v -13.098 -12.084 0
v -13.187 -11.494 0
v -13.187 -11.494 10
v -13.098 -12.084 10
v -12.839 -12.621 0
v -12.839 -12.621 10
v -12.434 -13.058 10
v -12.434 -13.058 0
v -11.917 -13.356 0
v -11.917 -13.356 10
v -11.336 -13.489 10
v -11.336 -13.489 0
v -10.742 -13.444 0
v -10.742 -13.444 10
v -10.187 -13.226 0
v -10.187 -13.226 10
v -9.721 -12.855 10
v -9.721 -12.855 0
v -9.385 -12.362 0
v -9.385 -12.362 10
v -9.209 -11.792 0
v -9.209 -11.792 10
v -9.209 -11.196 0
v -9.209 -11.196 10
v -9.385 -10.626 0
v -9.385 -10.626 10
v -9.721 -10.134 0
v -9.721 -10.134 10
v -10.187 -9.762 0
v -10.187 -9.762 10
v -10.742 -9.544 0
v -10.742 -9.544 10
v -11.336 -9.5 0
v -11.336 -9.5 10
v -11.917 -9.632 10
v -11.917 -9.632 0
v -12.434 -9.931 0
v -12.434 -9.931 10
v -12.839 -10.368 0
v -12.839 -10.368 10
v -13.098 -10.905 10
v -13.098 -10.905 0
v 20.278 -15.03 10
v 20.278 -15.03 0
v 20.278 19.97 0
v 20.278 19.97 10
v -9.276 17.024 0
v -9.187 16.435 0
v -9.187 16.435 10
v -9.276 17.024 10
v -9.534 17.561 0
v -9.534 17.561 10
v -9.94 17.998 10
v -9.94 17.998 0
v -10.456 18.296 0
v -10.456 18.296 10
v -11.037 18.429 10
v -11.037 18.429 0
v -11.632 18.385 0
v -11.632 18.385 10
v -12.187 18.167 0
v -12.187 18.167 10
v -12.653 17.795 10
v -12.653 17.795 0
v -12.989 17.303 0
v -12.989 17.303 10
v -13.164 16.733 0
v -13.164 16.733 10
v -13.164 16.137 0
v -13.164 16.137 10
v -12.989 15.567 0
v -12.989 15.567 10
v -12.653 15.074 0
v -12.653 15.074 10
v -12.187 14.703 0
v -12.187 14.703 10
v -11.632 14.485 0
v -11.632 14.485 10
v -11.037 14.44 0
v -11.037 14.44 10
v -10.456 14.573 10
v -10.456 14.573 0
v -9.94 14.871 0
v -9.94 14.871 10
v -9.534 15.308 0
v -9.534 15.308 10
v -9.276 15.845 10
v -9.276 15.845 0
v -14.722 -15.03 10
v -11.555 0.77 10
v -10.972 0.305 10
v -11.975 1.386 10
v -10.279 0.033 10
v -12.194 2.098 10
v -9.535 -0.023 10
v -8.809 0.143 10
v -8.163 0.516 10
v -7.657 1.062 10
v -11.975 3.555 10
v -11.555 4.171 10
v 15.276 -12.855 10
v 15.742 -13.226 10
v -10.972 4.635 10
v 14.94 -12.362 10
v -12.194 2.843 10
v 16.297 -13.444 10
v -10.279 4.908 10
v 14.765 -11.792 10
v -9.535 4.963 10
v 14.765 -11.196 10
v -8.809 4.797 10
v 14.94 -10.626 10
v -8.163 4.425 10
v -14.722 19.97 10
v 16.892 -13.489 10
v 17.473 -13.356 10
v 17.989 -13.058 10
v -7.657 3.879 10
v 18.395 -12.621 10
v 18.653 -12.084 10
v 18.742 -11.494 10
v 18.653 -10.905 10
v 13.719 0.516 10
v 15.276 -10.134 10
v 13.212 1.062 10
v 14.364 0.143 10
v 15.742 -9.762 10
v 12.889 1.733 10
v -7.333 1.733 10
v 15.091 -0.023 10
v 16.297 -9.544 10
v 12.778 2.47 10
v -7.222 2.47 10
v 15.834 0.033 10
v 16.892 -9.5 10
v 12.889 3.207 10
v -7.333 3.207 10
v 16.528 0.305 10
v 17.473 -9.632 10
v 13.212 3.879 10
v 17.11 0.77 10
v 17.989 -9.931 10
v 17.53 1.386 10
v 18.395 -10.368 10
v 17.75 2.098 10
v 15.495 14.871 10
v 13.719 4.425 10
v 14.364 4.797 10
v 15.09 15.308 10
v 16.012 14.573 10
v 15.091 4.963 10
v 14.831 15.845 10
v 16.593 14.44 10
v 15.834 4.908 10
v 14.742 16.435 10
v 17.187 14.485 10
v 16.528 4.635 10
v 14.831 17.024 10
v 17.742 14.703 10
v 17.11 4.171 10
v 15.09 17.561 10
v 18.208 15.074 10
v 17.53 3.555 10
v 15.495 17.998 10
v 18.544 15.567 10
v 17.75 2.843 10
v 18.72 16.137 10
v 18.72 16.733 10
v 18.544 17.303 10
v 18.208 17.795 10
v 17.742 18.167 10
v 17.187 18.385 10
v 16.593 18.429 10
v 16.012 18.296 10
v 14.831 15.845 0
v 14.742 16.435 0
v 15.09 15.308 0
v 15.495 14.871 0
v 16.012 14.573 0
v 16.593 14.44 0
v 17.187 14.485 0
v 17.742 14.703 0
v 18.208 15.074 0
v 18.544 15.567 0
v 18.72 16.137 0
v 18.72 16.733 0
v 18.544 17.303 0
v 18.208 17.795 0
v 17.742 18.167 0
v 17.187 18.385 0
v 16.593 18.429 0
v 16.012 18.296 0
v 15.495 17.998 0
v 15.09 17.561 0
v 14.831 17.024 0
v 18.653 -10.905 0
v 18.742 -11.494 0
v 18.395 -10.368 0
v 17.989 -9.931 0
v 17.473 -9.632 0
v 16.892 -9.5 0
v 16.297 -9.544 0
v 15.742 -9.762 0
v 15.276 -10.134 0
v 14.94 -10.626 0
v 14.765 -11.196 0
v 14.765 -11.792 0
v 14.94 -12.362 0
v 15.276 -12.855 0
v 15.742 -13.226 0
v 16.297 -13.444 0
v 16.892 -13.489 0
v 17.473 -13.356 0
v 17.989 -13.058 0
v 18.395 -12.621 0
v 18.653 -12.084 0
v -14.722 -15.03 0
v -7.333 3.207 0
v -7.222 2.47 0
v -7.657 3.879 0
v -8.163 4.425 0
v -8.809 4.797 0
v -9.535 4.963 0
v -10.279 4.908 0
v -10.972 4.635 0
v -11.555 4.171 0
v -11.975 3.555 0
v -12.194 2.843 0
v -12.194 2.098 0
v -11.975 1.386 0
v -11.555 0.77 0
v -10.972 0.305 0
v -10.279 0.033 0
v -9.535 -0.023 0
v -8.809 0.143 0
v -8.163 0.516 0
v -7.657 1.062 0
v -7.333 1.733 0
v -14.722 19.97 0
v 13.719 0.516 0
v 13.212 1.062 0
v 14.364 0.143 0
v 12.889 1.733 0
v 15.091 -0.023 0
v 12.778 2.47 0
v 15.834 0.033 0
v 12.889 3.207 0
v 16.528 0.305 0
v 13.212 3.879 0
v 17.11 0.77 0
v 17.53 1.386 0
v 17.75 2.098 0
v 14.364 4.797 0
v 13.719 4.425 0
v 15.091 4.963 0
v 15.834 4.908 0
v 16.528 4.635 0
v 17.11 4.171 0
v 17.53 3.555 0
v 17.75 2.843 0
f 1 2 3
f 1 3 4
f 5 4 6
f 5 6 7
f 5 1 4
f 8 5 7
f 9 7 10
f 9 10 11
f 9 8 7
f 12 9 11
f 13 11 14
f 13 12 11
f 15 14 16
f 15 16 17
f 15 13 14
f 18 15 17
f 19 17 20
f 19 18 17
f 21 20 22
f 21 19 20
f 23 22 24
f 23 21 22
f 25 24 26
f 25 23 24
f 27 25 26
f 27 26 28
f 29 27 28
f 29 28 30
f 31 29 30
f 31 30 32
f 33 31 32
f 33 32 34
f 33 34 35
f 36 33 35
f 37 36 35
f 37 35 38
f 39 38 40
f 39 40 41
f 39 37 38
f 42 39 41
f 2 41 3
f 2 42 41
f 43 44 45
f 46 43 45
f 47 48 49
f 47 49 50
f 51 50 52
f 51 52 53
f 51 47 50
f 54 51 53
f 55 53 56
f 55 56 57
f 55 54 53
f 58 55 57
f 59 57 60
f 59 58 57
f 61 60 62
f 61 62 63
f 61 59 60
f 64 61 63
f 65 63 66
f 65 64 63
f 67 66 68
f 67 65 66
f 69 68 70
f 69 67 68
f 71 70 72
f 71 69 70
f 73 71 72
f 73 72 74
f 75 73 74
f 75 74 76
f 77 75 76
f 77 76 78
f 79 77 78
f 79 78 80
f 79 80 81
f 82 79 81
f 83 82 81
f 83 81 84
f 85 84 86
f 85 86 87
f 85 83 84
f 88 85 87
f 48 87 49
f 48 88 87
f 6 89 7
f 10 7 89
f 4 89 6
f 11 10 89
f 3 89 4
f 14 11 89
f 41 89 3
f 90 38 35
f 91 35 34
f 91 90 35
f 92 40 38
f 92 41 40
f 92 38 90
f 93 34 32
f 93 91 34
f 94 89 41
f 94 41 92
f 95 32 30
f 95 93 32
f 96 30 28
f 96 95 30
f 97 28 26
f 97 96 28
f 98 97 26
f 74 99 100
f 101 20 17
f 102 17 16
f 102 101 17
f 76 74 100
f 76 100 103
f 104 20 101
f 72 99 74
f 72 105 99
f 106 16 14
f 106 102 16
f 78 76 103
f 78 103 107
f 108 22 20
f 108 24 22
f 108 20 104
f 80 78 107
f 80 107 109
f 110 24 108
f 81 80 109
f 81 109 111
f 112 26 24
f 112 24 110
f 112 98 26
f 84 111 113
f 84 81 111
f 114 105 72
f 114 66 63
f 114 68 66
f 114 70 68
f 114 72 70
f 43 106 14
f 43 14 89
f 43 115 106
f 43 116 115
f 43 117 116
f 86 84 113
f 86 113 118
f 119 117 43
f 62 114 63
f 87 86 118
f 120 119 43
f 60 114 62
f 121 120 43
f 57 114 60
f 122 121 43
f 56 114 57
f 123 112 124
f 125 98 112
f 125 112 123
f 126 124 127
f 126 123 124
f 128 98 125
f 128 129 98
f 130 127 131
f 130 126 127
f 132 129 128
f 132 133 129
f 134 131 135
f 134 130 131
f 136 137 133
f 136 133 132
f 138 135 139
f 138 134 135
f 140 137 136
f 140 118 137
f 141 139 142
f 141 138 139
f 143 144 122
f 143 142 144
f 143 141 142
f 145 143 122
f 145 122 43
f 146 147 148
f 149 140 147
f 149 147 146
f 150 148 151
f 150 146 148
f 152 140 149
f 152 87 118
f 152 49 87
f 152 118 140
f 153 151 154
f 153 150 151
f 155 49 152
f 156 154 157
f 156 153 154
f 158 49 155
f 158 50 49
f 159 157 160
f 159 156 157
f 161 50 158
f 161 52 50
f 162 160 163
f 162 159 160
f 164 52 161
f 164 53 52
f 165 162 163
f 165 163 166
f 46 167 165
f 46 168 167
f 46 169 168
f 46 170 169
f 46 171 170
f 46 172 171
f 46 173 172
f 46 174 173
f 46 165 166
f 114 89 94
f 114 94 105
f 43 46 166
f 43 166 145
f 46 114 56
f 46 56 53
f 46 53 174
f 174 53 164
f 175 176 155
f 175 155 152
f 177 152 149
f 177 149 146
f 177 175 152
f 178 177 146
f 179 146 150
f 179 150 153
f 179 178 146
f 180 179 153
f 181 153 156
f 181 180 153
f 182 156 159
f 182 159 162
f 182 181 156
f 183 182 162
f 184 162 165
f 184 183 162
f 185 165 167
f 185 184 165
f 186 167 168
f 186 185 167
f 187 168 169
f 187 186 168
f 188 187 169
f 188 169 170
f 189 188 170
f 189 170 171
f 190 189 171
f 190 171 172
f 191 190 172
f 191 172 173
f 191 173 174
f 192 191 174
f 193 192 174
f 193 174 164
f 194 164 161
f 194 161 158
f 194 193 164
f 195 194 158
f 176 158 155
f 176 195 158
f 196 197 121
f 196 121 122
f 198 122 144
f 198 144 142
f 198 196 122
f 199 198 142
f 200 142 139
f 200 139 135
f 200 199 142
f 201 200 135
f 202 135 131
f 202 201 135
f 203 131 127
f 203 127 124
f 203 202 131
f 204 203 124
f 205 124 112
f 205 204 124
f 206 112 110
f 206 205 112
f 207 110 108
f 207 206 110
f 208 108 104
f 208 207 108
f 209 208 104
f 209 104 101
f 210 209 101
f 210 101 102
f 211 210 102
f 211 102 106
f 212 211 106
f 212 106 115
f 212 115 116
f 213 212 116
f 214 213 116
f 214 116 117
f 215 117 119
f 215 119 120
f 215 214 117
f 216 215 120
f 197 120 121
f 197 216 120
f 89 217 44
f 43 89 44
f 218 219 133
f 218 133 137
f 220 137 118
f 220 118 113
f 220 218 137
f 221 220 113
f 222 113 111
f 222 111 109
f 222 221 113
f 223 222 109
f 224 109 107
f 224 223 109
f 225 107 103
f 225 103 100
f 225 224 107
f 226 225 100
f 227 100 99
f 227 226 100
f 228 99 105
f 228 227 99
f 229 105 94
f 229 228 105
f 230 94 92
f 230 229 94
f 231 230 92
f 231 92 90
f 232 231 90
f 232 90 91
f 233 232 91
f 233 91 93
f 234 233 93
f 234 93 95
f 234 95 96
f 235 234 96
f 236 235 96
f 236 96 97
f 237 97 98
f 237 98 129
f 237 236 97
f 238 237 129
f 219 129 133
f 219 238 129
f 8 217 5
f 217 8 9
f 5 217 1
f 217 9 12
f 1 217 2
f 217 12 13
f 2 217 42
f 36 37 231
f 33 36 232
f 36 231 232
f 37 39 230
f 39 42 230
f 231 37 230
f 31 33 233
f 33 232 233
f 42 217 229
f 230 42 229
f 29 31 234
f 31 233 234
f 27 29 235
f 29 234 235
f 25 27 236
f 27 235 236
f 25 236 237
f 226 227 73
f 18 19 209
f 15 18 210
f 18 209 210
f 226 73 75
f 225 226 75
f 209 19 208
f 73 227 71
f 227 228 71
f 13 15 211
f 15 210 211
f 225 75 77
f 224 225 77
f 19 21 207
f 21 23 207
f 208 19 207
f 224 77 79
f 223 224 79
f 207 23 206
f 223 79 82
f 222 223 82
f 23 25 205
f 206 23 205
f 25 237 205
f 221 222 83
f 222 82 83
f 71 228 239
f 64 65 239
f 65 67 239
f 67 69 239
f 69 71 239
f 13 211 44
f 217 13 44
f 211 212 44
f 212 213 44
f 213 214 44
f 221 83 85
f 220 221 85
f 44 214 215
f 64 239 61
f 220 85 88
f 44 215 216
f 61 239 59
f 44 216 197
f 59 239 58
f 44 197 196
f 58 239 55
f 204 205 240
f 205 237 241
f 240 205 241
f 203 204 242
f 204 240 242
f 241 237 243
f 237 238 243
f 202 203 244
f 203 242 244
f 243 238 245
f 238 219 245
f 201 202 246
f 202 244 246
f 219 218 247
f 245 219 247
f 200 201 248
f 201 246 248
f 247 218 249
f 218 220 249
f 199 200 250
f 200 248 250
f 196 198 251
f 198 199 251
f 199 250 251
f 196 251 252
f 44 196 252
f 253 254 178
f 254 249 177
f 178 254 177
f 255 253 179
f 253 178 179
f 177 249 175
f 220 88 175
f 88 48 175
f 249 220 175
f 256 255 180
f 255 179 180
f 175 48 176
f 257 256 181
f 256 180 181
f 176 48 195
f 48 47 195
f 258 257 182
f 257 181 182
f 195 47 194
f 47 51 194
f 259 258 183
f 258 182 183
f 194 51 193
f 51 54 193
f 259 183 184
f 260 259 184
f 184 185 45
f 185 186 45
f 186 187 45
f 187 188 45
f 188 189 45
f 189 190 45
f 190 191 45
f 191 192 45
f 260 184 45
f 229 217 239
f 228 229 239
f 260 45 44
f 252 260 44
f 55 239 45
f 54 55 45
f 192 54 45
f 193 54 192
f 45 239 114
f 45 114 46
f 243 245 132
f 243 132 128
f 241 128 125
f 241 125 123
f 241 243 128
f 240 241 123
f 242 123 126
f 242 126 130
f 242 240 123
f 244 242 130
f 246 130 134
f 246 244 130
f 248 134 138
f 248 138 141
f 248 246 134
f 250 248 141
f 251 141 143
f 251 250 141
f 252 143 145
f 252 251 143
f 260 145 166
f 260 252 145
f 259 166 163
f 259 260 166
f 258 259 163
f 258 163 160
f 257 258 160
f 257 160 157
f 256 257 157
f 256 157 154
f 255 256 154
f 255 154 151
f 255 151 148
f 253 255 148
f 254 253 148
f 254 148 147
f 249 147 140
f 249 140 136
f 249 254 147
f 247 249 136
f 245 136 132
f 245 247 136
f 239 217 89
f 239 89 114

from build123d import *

# Parameters (mm, degrees)
SKETCH1_W           = 35
SKETCH1_H           = 35
SKETCH1_R           = 2
SKETCH1_R_2         = 2.5
BOSS_EXTRUDE1_DEPTH = 10


with BuildPart() as part:
    # Sketch1 → Boss-Extrude1 (new body)
    with BuildSketch(Plane.XY):
        with Locations((2.777777778, 2.470273614)):
            Rectangle(SKETCH1_W, SKETCH1_H)
        with Locations((16.742243872, -11.49419248)):
            Circle(SKETCH1_R, mode=Mode.SUBTRACT)
        with Locations(Location((16.742243872, 16.434739708, 0), (0, 0, 180))):
            Circle(SKETCH1_R, mode=Mode.SUBTRACT)
        with Locations((-11.186688316, 16.434739708)):
            Circle(SKETCH1_R, mode=Mode.SUBTRACT)
        with Locations(Location((-11.186688316, -11.49419248, 0), (0, 0, 180))):
            Circle(SKETCH1_R, mode=Mode.SUBTRACT)
        with Locations(Location((15.277777778, 2.470273614, 0), (0, 0, 180))):
            Circle(SKETCH1_R_2, mode=Mode.SUBTRACT)
        with Locations((-9.722222222, 2.470273614)):
            Circle(SKETCH1_R_2, mode=Mode.SUBTRACT)
    extrude(amount=BOSS_EXTRUDE1_DEPTH)


solid = part.part
